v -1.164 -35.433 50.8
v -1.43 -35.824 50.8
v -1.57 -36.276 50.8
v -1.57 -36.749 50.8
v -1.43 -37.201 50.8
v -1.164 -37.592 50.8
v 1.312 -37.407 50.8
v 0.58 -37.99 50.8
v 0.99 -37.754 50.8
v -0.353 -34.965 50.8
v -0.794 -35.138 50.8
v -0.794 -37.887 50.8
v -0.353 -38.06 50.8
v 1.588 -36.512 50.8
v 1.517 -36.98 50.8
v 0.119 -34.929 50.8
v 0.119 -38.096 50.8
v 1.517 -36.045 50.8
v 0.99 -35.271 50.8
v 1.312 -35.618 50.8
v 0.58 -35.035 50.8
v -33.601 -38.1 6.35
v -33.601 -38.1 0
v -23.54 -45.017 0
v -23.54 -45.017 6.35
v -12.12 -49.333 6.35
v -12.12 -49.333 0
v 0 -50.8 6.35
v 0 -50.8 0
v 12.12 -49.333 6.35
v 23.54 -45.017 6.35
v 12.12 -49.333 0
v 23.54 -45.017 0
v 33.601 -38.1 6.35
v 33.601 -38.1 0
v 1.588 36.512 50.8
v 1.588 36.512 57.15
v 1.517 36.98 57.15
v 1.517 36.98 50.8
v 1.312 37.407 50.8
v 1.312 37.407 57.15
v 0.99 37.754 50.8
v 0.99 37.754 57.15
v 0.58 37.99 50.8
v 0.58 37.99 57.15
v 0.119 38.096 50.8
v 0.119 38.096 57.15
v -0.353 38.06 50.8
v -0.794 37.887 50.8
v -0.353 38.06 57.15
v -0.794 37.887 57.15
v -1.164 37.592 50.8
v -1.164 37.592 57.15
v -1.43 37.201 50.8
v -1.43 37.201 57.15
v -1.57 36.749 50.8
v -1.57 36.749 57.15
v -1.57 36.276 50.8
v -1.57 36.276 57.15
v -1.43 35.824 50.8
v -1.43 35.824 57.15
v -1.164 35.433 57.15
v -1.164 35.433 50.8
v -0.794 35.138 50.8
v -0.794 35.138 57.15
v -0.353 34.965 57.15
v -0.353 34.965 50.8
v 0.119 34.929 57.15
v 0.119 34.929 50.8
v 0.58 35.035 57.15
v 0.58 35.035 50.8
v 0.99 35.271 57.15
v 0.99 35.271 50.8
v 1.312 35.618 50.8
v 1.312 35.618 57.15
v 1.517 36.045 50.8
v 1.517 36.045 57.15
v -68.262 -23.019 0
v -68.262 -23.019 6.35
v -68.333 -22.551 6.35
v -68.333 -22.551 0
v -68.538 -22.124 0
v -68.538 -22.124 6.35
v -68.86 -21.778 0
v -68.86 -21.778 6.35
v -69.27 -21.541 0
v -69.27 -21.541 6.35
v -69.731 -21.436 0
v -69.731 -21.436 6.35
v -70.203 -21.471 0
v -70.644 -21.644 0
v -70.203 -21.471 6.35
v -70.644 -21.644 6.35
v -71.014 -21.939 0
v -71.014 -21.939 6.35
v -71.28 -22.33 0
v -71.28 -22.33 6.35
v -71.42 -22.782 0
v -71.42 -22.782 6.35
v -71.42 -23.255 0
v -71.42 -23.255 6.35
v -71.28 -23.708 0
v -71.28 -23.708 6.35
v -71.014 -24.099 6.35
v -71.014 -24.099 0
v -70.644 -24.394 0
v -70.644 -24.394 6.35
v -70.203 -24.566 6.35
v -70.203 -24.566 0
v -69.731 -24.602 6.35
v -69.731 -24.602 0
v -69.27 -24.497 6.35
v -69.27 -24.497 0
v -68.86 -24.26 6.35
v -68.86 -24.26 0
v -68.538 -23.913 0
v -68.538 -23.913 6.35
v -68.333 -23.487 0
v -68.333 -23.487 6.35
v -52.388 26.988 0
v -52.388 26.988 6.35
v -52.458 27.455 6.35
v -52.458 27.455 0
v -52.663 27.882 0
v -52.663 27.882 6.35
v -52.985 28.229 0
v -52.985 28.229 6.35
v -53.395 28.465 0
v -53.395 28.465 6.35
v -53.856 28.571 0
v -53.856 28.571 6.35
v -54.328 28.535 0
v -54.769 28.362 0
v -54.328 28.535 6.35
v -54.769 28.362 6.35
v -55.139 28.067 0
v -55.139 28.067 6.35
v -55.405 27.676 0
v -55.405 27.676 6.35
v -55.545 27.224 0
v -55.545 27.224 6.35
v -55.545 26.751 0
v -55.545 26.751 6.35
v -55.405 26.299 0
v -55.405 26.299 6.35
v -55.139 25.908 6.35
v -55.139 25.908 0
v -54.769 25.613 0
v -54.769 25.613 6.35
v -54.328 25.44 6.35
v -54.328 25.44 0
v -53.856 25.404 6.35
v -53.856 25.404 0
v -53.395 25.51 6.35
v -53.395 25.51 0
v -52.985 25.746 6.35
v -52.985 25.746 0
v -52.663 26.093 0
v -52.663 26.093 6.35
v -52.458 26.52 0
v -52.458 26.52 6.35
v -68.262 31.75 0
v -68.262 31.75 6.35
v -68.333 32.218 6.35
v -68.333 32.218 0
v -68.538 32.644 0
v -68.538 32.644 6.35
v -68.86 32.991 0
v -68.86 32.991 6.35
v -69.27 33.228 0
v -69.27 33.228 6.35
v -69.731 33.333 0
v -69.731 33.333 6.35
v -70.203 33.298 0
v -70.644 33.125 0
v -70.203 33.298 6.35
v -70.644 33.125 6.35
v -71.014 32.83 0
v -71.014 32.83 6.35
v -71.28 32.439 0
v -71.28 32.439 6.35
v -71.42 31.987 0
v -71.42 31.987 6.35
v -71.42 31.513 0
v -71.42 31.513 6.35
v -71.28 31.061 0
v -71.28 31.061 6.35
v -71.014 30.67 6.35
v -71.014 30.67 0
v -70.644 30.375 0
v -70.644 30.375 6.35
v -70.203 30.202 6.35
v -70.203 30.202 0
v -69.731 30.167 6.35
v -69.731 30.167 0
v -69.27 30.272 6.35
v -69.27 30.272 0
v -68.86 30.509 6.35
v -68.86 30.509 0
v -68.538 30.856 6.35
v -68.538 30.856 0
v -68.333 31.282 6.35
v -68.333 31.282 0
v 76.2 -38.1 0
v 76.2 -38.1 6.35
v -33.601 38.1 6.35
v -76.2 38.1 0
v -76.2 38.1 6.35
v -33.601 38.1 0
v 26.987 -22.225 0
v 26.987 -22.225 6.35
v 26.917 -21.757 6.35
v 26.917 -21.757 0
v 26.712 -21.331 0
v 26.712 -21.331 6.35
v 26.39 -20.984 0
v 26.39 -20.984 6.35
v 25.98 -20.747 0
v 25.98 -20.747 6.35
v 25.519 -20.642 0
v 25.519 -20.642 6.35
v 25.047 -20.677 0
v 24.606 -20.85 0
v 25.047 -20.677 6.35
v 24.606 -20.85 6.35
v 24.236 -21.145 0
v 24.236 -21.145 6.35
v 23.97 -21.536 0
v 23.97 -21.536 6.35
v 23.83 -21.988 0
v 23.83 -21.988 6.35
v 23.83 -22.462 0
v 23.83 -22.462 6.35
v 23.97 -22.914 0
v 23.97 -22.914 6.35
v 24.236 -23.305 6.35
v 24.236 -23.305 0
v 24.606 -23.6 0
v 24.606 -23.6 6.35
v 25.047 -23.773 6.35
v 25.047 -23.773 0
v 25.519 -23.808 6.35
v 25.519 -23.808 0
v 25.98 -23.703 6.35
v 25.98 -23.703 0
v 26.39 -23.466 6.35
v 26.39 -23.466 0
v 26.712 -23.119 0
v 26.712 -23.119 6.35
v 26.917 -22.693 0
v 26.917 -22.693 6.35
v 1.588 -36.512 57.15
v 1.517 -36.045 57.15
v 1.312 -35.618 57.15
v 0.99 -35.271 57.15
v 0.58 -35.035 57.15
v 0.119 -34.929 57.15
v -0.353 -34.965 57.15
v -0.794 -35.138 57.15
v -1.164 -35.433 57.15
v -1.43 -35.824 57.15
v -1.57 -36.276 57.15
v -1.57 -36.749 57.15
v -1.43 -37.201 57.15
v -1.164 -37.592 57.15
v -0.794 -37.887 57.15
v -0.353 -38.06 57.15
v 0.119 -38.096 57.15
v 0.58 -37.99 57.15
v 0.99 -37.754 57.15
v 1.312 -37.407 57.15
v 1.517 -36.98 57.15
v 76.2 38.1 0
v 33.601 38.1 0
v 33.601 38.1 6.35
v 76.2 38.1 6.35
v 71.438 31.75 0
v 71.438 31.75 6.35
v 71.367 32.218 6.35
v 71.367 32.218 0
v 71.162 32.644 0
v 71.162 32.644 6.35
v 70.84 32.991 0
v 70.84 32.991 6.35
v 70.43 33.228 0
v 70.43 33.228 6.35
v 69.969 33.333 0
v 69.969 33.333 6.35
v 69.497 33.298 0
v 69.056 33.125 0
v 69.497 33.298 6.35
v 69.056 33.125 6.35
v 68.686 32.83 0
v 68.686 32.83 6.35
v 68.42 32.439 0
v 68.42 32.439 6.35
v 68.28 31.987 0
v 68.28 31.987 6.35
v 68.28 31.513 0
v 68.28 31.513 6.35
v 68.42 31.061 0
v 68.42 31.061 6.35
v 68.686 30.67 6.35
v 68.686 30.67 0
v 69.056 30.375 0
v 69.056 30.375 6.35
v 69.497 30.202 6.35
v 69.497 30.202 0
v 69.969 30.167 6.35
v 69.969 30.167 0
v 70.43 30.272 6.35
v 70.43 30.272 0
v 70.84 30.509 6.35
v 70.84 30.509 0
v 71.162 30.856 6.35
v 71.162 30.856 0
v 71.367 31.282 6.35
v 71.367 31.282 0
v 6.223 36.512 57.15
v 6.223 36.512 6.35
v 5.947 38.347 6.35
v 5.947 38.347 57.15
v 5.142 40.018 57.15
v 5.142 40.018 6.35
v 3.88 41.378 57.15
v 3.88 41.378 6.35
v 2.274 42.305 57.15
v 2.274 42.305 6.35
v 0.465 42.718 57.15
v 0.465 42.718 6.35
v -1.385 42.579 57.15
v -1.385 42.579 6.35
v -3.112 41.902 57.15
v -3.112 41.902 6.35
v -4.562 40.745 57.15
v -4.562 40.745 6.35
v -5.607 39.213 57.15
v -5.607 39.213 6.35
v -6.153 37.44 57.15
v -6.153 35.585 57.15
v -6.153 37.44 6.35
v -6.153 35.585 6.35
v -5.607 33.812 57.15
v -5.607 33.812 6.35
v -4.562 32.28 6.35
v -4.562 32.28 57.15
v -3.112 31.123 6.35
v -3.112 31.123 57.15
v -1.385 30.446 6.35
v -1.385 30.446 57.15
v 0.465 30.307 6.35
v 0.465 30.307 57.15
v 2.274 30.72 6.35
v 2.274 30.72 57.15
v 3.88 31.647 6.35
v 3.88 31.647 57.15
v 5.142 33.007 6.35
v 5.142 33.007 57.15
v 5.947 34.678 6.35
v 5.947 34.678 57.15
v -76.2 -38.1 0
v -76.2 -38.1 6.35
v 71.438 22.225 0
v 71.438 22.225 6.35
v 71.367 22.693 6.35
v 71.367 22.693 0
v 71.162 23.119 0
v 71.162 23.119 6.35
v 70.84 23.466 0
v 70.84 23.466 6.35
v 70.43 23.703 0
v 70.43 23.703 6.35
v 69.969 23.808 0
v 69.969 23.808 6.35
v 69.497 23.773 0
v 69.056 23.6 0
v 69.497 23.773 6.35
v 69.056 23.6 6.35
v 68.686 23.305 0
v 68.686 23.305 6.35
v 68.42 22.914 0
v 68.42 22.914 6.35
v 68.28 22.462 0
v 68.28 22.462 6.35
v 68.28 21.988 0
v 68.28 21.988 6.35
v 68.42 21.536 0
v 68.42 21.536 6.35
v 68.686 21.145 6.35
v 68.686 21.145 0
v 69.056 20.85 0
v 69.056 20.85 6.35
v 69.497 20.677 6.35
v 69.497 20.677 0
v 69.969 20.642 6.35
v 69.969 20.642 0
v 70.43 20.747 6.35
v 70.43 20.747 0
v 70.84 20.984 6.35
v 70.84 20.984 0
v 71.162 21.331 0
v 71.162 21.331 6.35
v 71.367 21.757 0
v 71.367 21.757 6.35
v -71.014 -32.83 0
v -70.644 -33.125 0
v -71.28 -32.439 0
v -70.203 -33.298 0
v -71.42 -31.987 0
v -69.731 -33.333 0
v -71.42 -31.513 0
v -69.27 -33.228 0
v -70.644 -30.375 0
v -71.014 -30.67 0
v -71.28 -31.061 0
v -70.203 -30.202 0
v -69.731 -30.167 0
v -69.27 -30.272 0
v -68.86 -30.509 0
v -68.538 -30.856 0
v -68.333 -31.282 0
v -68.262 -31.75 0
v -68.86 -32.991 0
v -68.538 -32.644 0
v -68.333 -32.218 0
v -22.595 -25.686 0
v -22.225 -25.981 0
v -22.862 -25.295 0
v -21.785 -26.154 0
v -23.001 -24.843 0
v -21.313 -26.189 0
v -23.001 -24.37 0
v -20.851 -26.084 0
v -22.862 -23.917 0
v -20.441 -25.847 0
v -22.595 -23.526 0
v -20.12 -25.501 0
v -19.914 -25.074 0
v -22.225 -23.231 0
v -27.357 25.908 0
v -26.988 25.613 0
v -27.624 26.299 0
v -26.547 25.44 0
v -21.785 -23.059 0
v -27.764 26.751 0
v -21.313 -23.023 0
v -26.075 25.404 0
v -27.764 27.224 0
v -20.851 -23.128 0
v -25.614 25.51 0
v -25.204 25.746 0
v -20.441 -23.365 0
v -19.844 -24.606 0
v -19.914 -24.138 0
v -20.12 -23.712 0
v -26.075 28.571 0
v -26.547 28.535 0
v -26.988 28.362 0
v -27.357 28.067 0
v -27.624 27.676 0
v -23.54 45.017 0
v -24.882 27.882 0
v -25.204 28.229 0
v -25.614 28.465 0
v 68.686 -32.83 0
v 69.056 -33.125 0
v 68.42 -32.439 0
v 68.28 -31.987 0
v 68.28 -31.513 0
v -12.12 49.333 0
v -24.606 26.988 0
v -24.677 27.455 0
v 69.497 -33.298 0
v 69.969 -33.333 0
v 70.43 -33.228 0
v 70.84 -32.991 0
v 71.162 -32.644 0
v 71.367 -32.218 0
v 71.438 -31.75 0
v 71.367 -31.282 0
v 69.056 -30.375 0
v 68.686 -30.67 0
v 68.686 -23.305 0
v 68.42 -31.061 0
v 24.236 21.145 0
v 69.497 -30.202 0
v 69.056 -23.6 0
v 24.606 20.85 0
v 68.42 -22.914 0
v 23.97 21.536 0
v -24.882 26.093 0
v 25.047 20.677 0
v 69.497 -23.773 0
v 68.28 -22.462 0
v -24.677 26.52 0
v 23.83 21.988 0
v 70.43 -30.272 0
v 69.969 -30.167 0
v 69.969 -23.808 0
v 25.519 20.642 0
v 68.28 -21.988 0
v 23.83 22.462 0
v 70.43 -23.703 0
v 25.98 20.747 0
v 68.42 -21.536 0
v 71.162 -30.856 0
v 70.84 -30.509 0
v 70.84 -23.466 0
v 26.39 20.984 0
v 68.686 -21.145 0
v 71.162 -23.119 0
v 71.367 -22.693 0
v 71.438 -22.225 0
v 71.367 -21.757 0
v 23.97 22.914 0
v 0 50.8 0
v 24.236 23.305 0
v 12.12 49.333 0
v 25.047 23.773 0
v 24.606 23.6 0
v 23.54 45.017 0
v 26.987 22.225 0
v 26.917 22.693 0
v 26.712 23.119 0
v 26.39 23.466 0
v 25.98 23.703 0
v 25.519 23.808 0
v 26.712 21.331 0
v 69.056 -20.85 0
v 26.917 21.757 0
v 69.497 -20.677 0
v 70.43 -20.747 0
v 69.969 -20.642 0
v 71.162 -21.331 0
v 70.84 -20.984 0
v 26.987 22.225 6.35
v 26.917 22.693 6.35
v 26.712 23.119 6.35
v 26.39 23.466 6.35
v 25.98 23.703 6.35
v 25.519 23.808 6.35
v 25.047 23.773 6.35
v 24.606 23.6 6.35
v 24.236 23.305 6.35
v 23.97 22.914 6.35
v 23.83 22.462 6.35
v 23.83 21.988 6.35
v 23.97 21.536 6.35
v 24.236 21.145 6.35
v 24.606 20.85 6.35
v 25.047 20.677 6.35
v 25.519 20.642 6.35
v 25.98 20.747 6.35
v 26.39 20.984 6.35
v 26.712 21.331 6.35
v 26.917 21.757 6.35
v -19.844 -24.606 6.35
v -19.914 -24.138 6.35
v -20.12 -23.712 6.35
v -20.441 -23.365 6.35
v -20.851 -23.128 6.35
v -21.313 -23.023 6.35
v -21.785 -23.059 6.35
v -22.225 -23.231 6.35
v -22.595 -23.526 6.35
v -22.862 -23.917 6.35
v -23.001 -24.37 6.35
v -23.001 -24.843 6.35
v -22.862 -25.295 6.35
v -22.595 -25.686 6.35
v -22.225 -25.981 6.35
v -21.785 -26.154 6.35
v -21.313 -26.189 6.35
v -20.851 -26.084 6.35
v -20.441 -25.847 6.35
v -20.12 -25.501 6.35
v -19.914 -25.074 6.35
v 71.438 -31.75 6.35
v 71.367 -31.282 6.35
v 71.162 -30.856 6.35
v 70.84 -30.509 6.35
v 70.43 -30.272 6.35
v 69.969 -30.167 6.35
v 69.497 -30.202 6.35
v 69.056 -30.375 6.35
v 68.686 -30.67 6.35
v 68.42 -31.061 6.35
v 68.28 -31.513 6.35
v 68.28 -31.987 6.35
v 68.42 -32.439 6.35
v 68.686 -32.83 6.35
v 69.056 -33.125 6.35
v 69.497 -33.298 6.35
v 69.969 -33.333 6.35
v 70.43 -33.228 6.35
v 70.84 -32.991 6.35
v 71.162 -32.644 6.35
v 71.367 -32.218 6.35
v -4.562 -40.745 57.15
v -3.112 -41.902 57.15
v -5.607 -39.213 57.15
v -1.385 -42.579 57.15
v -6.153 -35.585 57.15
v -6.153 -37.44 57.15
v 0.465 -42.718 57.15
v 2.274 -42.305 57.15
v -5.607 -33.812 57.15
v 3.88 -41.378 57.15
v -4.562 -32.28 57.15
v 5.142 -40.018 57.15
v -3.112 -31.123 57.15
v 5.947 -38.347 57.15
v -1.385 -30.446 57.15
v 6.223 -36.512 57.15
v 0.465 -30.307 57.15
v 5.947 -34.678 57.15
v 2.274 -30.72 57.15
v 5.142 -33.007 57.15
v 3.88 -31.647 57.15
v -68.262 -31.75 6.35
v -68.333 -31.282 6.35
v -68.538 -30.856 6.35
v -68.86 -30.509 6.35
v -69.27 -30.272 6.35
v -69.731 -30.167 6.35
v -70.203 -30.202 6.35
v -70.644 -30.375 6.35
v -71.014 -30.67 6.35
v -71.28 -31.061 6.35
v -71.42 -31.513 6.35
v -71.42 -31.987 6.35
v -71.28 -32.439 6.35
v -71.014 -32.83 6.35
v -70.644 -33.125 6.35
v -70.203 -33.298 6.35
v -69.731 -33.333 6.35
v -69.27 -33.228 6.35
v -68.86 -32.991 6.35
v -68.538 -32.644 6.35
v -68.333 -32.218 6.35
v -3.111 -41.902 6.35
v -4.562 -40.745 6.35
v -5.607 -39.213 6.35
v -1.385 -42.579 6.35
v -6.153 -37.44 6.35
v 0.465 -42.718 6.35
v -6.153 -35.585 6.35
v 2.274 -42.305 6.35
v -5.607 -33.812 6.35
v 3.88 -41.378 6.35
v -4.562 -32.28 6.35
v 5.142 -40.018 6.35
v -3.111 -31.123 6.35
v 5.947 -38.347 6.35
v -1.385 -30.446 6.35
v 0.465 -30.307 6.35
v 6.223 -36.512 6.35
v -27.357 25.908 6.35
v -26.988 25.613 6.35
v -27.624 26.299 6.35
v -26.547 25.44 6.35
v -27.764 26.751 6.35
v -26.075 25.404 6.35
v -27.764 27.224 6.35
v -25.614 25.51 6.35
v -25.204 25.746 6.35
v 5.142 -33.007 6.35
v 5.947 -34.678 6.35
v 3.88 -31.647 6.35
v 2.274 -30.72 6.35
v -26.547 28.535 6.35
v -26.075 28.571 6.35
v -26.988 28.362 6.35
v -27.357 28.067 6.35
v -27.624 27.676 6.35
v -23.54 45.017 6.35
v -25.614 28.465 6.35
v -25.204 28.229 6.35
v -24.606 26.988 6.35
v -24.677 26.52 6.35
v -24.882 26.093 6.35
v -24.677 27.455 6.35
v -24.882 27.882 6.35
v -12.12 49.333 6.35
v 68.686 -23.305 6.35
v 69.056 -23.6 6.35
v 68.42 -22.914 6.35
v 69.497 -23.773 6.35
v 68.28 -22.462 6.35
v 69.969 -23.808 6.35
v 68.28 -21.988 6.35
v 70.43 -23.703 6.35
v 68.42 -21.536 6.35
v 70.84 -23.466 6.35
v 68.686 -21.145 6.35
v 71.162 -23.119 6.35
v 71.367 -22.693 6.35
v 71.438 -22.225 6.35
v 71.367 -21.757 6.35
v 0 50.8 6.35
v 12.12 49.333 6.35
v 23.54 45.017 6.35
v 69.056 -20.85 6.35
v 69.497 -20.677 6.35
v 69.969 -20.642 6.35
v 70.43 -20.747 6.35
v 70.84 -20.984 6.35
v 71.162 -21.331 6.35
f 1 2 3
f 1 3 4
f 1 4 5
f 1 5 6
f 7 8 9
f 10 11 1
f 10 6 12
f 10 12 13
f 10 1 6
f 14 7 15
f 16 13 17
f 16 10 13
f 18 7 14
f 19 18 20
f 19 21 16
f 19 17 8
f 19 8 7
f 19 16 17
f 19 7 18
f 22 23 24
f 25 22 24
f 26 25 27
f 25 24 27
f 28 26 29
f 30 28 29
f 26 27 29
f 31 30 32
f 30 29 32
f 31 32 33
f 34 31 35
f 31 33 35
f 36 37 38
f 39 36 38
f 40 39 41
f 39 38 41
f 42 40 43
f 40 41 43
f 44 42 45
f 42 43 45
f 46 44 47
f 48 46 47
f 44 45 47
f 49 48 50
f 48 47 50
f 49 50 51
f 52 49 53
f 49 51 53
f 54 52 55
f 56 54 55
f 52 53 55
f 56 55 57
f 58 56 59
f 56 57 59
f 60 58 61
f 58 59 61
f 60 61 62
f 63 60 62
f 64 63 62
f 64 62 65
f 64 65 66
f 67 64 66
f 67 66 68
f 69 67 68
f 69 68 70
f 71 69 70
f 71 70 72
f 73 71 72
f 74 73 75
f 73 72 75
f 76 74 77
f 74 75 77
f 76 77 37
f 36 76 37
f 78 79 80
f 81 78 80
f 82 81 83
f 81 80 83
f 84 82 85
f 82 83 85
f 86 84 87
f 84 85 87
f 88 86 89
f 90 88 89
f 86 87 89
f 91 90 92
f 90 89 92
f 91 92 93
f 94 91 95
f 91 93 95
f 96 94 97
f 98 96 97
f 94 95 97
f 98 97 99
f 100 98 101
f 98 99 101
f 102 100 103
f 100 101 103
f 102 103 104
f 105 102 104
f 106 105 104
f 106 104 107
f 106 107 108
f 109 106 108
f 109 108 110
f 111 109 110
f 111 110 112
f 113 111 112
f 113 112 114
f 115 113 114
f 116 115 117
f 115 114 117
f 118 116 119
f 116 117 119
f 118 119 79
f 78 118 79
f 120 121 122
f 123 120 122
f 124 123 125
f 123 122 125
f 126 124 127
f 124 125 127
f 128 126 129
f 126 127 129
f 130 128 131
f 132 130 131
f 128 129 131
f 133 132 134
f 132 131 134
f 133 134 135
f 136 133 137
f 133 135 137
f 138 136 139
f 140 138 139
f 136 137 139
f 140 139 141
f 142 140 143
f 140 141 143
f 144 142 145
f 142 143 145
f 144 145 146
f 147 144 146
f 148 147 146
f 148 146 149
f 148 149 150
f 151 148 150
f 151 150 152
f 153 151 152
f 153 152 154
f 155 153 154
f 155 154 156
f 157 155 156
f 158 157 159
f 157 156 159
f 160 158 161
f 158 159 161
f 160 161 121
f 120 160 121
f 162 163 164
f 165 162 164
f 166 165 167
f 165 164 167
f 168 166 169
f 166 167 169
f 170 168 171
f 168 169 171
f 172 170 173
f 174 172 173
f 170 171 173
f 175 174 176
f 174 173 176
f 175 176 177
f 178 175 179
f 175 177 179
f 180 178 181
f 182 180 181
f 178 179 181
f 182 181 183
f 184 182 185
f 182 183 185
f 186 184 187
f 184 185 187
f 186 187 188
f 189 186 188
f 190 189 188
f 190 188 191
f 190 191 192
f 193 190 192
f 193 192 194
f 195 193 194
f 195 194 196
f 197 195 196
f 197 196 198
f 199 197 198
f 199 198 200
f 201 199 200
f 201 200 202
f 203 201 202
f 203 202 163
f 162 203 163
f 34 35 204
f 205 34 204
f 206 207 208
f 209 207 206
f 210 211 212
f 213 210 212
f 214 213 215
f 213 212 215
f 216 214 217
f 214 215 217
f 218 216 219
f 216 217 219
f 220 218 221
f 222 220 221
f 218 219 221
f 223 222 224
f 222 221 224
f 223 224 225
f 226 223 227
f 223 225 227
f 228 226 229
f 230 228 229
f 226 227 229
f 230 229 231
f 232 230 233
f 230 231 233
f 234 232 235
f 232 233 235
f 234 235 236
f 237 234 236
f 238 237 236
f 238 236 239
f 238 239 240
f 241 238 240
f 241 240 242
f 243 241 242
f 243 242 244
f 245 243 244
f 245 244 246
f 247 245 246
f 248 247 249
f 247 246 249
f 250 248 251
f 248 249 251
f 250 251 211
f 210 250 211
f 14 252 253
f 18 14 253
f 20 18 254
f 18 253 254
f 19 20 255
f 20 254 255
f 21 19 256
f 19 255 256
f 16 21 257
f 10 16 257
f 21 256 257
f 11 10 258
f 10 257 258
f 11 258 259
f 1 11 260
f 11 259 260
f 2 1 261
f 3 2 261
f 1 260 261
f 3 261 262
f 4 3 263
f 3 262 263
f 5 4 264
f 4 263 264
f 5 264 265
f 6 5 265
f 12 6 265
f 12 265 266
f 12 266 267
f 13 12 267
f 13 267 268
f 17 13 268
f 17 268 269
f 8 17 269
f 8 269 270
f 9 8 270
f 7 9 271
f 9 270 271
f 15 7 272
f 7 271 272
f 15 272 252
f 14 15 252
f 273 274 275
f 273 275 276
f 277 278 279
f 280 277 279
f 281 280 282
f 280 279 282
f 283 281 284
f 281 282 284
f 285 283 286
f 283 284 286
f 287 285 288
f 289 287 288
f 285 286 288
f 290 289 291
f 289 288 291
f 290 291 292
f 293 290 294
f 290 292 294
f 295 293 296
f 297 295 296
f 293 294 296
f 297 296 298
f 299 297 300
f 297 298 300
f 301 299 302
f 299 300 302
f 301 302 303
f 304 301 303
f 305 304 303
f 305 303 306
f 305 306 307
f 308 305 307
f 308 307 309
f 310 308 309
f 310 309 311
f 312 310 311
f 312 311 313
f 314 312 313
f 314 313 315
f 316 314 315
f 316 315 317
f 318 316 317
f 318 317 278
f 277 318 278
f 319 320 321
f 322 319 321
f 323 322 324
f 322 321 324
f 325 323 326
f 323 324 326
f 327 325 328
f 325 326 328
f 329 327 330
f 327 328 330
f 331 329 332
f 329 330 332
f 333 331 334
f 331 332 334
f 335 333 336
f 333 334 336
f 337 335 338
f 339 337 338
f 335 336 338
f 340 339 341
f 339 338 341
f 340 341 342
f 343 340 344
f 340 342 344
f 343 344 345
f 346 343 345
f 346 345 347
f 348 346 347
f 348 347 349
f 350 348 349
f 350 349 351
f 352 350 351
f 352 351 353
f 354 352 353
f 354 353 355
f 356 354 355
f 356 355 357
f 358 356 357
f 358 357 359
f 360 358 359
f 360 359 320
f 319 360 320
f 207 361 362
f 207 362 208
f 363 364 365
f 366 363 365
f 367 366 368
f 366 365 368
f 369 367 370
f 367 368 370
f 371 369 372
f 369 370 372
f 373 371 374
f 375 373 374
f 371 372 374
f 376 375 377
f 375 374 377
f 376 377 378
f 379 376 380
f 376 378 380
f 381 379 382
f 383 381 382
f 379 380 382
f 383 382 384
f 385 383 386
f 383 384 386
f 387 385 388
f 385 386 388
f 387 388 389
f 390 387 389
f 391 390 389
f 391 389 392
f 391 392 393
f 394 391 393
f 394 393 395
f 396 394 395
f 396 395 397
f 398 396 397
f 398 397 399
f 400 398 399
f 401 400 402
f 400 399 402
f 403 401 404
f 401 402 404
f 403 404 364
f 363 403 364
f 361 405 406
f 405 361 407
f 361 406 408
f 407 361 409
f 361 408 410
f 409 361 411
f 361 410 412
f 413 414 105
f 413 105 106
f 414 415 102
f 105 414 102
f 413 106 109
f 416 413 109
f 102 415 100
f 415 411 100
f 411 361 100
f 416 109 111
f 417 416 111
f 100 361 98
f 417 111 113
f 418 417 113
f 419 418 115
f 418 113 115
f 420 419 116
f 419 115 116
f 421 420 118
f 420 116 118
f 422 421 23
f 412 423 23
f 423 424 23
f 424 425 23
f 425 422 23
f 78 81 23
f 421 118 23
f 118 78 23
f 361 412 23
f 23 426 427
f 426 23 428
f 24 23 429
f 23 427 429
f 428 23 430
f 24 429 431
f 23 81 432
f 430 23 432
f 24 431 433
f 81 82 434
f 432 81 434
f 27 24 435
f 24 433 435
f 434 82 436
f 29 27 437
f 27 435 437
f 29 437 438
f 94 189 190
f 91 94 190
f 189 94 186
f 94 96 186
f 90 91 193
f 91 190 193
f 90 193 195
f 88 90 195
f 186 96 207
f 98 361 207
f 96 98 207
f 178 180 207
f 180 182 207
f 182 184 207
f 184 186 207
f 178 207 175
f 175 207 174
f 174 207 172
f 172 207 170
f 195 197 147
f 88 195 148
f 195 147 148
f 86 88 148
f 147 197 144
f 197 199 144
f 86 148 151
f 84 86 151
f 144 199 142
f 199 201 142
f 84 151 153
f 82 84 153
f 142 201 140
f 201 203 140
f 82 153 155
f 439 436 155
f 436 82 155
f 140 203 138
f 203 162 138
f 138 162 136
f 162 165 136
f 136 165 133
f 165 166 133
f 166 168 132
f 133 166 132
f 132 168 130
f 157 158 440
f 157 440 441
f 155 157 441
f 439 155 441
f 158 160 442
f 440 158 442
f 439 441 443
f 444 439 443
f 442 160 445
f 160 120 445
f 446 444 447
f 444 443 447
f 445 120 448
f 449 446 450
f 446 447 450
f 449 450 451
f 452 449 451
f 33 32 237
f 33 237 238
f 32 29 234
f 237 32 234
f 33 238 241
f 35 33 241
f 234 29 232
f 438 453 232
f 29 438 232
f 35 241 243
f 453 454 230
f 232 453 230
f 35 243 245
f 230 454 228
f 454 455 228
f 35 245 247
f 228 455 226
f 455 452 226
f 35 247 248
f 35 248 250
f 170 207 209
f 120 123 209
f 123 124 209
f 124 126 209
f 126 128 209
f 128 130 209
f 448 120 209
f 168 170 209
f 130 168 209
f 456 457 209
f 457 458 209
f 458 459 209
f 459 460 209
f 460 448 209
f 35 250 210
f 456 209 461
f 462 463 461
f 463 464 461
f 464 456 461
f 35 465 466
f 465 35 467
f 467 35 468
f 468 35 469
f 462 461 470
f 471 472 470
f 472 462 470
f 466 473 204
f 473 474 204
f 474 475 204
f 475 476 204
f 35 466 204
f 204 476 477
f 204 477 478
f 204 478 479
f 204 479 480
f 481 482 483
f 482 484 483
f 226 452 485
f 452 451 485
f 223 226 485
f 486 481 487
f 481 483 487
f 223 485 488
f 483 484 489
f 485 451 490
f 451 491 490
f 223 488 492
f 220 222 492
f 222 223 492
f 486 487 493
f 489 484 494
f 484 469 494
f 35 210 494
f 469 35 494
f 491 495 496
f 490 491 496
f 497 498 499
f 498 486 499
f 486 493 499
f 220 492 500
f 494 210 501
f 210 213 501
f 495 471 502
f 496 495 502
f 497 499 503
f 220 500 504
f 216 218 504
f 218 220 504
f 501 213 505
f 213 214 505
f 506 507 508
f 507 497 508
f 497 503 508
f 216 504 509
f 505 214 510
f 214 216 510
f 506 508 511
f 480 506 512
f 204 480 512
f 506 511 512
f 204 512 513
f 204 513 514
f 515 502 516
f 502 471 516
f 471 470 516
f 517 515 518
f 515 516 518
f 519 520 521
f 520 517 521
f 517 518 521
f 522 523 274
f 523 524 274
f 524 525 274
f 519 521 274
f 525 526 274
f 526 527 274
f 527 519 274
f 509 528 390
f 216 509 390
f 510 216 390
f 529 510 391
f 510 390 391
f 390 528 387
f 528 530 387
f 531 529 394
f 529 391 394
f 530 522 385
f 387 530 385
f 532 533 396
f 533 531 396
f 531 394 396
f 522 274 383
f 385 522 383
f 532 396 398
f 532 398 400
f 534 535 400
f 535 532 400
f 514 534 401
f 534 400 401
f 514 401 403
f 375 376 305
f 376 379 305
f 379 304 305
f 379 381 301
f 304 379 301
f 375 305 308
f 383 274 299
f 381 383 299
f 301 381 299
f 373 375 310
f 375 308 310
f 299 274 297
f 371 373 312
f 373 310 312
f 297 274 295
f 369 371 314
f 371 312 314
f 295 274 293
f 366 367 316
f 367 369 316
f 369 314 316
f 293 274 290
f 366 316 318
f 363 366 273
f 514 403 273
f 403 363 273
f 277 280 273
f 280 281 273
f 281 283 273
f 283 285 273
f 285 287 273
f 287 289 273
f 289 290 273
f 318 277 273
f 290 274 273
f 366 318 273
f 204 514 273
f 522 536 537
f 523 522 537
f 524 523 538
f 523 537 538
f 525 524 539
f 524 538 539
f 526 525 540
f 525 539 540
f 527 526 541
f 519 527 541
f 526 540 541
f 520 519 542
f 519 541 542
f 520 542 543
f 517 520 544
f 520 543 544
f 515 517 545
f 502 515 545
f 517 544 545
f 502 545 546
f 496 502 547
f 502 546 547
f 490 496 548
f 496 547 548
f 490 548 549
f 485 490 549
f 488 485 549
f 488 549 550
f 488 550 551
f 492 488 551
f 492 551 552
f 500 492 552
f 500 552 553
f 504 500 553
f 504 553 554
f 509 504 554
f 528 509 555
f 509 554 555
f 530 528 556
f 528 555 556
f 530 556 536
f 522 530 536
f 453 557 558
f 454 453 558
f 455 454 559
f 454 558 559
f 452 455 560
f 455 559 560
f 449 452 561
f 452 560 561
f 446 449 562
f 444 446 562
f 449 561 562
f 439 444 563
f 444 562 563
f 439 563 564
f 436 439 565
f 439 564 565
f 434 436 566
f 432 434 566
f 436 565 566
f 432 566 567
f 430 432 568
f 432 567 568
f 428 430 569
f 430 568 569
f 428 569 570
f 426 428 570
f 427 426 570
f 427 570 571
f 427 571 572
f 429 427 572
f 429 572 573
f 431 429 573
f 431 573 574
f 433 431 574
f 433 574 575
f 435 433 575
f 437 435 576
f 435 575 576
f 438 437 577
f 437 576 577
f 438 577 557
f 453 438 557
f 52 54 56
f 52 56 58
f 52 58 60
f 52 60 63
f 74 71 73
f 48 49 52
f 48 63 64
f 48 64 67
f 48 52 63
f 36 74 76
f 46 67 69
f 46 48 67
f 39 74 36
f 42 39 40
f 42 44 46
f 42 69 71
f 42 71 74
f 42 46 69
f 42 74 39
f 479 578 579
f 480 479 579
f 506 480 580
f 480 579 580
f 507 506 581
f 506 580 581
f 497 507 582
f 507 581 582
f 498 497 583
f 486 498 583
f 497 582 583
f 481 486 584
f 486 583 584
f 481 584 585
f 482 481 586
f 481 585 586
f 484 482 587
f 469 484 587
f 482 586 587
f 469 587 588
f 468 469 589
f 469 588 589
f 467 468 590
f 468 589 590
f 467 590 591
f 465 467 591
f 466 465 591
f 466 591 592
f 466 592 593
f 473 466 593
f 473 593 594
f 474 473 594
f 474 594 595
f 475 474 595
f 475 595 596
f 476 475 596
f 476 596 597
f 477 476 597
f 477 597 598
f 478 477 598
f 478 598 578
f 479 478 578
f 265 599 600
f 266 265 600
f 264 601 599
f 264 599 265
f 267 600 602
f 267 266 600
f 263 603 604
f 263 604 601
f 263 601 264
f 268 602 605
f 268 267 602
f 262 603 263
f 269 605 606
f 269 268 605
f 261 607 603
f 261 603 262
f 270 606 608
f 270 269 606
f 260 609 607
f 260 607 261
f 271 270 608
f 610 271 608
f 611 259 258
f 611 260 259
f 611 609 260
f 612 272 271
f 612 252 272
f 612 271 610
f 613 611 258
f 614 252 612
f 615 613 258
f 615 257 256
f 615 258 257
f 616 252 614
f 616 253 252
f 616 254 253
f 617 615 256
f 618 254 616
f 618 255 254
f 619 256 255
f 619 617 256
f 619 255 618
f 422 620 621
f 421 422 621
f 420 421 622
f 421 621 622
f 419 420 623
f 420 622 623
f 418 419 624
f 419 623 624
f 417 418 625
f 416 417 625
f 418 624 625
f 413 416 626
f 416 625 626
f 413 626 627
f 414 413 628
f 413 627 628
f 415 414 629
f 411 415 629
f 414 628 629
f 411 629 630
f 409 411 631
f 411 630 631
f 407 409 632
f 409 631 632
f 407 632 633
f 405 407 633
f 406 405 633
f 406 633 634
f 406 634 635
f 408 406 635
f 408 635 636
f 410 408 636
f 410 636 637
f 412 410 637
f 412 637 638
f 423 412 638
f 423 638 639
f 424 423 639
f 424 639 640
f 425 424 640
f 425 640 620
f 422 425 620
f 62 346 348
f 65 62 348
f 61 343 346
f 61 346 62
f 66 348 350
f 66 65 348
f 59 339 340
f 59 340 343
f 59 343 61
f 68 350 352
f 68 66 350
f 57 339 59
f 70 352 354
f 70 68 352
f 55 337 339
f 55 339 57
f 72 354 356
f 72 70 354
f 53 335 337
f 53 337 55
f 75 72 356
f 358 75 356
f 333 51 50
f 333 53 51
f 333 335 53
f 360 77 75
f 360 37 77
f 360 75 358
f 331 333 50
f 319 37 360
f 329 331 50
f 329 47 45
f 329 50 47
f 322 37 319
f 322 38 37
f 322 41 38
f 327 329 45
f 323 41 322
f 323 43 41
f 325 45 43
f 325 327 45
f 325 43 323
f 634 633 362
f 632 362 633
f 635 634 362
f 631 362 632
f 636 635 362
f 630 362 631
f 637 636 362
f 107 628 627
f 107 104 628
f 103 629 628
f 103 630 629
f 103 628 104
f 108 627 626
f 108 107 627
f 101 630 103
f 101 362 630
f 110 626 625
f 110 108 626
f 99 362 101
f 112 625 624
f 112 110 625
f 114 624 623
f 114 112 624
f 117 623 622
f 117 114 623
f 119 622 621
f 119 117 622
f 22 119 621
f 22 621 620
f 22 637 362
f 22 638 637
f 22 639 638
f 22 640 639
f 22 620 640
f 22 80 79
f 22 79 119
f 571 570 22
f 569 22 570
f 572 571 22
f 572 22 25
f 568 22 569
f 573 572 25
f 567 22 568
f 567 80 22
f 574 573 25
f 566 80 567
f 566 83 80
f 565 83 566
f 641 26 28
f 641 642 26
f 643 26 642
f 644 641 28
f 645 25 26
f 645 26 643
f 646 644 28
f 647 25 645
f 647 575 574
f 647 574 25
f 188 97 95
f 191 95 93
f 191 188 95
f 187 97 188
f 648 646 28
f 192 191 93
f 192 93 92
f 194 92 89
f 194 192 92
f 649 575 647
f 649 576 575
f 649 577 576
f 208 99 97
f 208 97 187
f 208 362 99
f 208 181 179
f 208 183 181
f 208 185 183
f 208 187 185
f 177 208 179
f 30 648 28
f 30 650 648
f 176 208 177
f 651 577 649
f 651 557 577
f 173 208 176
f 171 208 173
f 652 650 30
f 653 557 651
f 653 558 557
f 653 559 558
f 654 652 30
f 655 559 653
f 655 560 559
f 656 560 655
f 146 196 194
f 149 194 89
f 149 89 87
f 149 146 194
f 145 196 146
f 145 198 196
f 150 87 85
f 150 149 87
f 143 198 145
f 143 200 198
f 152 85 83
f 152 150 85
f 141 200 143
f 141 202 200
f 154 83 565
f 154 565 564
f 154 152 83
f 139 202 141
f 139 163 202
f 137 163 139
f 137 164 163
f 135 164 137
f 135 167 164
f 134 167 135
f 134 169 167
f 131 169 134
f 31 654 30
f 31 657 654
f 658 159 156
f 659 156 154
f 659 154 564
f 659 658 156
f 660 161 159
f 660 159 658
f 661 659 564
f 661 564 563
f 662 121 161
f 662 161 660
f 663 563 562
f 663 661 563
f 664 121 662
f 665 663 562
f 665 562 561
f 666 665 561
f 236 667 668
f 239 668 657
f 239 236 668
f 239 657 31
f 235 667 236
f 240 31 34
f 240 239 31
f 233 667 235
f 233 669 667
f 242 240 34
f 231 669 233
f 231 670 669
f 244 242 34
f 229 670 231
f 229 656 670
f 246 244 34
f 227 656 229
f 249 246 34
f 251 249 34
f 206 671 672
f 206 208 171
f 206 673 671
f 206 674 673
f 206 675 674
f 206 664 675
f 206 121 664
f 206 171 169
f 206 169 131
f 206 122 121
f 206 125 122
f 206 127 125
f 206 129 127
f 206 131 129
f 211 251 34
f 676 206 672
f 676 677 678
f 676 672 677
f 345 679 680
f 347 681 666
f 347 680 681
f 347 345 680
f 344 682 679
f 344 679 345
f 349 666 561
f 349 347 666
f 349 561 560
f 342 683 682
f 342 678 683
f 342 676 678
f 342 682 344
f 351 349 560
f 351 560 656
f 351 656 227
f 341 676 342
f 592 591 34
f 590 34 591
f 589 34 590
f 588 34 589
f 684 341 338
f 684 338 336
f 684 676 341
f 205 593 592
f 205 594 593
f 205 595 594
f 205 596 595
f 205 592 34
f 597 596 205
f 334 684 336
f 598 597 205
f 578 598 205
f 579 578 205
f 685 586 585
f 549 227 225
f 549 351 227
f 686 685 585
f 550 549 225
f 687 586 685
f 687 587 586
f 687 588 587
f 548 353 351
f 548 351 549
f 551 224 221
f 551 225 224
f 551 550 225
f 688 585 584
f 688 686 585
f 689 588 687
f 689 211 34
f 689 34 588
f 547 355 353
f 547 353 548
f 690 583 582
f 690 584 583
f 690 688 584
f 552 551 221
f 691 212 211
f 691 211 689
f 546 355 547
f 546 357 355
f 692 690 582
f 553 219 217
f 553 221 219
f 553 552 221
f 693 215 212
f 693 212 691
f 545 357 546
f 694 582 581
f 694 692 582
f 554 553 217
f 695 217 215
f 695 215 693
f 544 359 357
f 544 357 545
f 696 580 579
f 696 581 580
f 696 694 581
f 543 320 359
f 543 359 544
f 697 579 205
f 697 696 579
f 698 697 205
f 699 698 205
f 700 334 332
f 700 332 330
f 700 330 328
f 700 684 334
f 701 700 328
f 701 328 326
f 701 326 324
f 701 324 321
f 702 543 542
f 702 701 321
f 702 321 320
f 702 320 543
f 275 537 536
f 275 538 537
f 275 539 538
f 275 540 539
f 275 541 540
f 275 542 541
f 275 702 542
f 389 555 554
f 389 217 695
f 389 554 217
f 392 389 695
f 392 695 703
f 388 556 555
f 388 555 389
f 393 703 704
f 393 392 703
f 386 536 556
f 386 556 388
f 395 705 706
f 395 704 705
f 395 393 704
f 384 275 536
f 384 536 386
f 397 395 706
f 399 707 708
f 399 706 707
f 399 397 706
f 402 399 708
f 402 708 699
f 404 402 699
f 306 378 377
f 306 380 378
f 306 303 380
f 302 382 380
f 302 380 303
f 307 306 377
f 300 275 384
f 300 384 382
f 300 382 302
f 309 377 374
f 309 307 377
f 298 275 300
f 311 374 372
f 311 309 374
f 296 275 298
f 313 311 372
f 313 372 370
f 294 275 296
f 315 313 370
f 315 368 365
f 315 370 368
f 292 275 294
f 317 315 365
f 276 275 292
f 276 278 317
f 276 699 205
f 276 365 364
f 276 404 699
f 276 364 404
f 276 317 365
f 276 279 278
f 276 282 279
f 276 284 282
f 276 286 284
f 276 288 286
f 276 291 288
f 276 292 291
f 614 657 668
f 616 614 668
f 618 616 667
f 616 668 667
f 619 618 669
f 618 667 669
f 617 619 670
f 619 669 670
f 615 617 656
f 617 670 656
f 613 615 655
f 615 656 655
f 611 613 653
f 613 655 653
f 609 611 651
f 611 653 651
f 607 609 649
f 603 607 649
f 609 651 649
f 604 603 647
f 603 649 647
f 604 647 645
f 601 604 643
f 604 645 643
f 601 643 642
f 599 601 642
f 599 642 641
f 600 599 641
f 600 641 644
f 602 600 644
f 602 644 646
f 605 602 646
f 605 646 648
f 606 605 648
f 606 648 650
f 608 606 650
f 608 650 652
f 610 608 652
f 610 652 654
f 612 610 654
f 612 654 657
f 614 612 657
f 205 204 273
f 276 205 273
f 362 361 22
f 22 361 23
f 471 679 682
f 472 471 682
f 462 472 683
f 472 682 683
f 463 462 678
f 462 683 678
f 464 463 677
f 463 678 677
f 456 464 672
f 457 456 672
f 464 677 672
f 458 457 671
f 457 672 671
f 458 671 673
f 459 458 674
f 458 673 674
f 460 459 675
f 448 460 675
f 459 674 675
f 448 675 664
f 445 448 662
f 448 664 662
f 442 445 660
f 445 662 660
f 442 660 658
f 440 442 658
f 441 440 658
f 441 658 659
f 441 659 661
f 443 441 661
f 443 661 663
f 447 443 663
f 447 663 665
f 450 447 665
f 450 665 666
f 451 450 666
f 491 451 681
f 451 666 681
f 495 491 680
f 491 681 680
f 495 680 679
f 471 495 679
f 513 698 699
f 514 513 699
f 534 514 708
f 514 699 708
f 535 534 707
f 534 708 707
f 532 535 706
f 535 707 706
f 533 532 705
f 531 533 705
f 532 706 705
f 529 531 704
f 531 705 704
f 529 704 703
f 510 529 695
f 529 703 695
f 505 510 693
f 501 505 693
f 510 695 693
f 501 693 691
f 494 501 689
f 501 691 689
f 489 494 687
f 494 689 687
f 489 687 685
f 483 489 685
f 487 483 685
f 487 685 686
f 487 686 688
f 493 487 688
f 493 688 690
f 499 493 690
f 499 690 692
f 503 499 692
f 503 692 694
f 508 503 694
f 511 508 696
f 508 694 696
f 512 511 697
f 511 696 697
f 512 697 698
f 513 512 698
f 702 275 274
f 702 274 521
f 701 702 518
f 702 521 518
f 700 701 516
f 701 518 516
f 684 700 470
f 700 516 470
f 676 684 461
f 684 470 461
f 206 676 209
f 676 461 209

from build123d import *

# Parameters (mm, degrees)
F0_R      = 50.8
F1_DEPTH  = 6.35
F2_R      = 6.223
F3_DEPTH  = 50.8
F4_W      = 152.4
F4_H      = 76.2
F5_DEPTH  = 6.35
F6_R      = 1.5875
F7_DEPTH  = 6.35
F8_R      = 1.5875
F9_DEPTH  = 6.35
F10_R     = 1.5875
F11_DEPTH = 25.4


with BuildPart() as f1:
    # F0 (on Top) → F1 (new body)
    with BuildSketch(Plane.XY):
        Circle(F0_R)
    extrude(amount=F1_DEPTH)

    # F2 (on face) → F3 (join)
    with BuildSketch(Plane.XY.offset(6.35)):
        with Locations((0, -36.5125)):
            Circle(F2_R)
        with Locations((0, 36.5125)):
            Circle(F2_R)
    extrude(amount=F3_DEPTH)

    # F4 (on Top) → F5 (join)
    with BuildSketch(Plane.XY):
        Rectangle(F4_W, F4_H)
    extrude(amount=F5_DEPTH)

    # F6 (on face) → F7 (cut, through all)
    with BuildSketch(Plane.XY.offset(6.35)):
        with Locations((-53.975, 26.9875)):
            Circle(F6_R)
        with Locations((-69.85, -23.01875)):
            Circle(F6_R)
        with Locations((-26.19375, 26.9875)):
            Circle(F6_R)
        with Locations((-21.43125, -24.60625)):
            Circle(F6_R)
        with Locations((25.4, 22.225)):
            Circle(F6_R)
        with Locations((69.85, 22.225)):
            Circle(F6_R)
        with Locations((25.4, -22.225)):
            Circle(F6_R)
        with Locations((69.85, -22.225)):
            Circle(F6_R)
    extrude(amount=-F7_DEPTH, mode=Mode.SUBTRACT)

    # F8 (on face) → F9 (cut)
    with BuildSketch(Plane.XY.offset(57.15)):
        with Locations((0, 36.5125)):
            Circle(F8_R)
        with Locations((0, -36.5125)):
            Circle(F8_R)
    extrude(amount=-F9_DEPTH, mode=Mode.SUBTRACT)

    # F10 (on face) → F11 (cut)
    with BuildSketch(Plane.XY.offset(6.35)):
        with Locations((-69.85, 31.75)):
            Circle(F10_R)
        with Locations((-69.85, -31.75)):
            Circle(F10_R)
        with Locations((69.85, -31.75)):
            Circle(F10_R)
        with Locations((69.85, 31.75)):
            Circle(F10_R)
    extrude(amount=-F11_DEPTH, mode=Mode.SUBTRACT)


solid = f1.part
